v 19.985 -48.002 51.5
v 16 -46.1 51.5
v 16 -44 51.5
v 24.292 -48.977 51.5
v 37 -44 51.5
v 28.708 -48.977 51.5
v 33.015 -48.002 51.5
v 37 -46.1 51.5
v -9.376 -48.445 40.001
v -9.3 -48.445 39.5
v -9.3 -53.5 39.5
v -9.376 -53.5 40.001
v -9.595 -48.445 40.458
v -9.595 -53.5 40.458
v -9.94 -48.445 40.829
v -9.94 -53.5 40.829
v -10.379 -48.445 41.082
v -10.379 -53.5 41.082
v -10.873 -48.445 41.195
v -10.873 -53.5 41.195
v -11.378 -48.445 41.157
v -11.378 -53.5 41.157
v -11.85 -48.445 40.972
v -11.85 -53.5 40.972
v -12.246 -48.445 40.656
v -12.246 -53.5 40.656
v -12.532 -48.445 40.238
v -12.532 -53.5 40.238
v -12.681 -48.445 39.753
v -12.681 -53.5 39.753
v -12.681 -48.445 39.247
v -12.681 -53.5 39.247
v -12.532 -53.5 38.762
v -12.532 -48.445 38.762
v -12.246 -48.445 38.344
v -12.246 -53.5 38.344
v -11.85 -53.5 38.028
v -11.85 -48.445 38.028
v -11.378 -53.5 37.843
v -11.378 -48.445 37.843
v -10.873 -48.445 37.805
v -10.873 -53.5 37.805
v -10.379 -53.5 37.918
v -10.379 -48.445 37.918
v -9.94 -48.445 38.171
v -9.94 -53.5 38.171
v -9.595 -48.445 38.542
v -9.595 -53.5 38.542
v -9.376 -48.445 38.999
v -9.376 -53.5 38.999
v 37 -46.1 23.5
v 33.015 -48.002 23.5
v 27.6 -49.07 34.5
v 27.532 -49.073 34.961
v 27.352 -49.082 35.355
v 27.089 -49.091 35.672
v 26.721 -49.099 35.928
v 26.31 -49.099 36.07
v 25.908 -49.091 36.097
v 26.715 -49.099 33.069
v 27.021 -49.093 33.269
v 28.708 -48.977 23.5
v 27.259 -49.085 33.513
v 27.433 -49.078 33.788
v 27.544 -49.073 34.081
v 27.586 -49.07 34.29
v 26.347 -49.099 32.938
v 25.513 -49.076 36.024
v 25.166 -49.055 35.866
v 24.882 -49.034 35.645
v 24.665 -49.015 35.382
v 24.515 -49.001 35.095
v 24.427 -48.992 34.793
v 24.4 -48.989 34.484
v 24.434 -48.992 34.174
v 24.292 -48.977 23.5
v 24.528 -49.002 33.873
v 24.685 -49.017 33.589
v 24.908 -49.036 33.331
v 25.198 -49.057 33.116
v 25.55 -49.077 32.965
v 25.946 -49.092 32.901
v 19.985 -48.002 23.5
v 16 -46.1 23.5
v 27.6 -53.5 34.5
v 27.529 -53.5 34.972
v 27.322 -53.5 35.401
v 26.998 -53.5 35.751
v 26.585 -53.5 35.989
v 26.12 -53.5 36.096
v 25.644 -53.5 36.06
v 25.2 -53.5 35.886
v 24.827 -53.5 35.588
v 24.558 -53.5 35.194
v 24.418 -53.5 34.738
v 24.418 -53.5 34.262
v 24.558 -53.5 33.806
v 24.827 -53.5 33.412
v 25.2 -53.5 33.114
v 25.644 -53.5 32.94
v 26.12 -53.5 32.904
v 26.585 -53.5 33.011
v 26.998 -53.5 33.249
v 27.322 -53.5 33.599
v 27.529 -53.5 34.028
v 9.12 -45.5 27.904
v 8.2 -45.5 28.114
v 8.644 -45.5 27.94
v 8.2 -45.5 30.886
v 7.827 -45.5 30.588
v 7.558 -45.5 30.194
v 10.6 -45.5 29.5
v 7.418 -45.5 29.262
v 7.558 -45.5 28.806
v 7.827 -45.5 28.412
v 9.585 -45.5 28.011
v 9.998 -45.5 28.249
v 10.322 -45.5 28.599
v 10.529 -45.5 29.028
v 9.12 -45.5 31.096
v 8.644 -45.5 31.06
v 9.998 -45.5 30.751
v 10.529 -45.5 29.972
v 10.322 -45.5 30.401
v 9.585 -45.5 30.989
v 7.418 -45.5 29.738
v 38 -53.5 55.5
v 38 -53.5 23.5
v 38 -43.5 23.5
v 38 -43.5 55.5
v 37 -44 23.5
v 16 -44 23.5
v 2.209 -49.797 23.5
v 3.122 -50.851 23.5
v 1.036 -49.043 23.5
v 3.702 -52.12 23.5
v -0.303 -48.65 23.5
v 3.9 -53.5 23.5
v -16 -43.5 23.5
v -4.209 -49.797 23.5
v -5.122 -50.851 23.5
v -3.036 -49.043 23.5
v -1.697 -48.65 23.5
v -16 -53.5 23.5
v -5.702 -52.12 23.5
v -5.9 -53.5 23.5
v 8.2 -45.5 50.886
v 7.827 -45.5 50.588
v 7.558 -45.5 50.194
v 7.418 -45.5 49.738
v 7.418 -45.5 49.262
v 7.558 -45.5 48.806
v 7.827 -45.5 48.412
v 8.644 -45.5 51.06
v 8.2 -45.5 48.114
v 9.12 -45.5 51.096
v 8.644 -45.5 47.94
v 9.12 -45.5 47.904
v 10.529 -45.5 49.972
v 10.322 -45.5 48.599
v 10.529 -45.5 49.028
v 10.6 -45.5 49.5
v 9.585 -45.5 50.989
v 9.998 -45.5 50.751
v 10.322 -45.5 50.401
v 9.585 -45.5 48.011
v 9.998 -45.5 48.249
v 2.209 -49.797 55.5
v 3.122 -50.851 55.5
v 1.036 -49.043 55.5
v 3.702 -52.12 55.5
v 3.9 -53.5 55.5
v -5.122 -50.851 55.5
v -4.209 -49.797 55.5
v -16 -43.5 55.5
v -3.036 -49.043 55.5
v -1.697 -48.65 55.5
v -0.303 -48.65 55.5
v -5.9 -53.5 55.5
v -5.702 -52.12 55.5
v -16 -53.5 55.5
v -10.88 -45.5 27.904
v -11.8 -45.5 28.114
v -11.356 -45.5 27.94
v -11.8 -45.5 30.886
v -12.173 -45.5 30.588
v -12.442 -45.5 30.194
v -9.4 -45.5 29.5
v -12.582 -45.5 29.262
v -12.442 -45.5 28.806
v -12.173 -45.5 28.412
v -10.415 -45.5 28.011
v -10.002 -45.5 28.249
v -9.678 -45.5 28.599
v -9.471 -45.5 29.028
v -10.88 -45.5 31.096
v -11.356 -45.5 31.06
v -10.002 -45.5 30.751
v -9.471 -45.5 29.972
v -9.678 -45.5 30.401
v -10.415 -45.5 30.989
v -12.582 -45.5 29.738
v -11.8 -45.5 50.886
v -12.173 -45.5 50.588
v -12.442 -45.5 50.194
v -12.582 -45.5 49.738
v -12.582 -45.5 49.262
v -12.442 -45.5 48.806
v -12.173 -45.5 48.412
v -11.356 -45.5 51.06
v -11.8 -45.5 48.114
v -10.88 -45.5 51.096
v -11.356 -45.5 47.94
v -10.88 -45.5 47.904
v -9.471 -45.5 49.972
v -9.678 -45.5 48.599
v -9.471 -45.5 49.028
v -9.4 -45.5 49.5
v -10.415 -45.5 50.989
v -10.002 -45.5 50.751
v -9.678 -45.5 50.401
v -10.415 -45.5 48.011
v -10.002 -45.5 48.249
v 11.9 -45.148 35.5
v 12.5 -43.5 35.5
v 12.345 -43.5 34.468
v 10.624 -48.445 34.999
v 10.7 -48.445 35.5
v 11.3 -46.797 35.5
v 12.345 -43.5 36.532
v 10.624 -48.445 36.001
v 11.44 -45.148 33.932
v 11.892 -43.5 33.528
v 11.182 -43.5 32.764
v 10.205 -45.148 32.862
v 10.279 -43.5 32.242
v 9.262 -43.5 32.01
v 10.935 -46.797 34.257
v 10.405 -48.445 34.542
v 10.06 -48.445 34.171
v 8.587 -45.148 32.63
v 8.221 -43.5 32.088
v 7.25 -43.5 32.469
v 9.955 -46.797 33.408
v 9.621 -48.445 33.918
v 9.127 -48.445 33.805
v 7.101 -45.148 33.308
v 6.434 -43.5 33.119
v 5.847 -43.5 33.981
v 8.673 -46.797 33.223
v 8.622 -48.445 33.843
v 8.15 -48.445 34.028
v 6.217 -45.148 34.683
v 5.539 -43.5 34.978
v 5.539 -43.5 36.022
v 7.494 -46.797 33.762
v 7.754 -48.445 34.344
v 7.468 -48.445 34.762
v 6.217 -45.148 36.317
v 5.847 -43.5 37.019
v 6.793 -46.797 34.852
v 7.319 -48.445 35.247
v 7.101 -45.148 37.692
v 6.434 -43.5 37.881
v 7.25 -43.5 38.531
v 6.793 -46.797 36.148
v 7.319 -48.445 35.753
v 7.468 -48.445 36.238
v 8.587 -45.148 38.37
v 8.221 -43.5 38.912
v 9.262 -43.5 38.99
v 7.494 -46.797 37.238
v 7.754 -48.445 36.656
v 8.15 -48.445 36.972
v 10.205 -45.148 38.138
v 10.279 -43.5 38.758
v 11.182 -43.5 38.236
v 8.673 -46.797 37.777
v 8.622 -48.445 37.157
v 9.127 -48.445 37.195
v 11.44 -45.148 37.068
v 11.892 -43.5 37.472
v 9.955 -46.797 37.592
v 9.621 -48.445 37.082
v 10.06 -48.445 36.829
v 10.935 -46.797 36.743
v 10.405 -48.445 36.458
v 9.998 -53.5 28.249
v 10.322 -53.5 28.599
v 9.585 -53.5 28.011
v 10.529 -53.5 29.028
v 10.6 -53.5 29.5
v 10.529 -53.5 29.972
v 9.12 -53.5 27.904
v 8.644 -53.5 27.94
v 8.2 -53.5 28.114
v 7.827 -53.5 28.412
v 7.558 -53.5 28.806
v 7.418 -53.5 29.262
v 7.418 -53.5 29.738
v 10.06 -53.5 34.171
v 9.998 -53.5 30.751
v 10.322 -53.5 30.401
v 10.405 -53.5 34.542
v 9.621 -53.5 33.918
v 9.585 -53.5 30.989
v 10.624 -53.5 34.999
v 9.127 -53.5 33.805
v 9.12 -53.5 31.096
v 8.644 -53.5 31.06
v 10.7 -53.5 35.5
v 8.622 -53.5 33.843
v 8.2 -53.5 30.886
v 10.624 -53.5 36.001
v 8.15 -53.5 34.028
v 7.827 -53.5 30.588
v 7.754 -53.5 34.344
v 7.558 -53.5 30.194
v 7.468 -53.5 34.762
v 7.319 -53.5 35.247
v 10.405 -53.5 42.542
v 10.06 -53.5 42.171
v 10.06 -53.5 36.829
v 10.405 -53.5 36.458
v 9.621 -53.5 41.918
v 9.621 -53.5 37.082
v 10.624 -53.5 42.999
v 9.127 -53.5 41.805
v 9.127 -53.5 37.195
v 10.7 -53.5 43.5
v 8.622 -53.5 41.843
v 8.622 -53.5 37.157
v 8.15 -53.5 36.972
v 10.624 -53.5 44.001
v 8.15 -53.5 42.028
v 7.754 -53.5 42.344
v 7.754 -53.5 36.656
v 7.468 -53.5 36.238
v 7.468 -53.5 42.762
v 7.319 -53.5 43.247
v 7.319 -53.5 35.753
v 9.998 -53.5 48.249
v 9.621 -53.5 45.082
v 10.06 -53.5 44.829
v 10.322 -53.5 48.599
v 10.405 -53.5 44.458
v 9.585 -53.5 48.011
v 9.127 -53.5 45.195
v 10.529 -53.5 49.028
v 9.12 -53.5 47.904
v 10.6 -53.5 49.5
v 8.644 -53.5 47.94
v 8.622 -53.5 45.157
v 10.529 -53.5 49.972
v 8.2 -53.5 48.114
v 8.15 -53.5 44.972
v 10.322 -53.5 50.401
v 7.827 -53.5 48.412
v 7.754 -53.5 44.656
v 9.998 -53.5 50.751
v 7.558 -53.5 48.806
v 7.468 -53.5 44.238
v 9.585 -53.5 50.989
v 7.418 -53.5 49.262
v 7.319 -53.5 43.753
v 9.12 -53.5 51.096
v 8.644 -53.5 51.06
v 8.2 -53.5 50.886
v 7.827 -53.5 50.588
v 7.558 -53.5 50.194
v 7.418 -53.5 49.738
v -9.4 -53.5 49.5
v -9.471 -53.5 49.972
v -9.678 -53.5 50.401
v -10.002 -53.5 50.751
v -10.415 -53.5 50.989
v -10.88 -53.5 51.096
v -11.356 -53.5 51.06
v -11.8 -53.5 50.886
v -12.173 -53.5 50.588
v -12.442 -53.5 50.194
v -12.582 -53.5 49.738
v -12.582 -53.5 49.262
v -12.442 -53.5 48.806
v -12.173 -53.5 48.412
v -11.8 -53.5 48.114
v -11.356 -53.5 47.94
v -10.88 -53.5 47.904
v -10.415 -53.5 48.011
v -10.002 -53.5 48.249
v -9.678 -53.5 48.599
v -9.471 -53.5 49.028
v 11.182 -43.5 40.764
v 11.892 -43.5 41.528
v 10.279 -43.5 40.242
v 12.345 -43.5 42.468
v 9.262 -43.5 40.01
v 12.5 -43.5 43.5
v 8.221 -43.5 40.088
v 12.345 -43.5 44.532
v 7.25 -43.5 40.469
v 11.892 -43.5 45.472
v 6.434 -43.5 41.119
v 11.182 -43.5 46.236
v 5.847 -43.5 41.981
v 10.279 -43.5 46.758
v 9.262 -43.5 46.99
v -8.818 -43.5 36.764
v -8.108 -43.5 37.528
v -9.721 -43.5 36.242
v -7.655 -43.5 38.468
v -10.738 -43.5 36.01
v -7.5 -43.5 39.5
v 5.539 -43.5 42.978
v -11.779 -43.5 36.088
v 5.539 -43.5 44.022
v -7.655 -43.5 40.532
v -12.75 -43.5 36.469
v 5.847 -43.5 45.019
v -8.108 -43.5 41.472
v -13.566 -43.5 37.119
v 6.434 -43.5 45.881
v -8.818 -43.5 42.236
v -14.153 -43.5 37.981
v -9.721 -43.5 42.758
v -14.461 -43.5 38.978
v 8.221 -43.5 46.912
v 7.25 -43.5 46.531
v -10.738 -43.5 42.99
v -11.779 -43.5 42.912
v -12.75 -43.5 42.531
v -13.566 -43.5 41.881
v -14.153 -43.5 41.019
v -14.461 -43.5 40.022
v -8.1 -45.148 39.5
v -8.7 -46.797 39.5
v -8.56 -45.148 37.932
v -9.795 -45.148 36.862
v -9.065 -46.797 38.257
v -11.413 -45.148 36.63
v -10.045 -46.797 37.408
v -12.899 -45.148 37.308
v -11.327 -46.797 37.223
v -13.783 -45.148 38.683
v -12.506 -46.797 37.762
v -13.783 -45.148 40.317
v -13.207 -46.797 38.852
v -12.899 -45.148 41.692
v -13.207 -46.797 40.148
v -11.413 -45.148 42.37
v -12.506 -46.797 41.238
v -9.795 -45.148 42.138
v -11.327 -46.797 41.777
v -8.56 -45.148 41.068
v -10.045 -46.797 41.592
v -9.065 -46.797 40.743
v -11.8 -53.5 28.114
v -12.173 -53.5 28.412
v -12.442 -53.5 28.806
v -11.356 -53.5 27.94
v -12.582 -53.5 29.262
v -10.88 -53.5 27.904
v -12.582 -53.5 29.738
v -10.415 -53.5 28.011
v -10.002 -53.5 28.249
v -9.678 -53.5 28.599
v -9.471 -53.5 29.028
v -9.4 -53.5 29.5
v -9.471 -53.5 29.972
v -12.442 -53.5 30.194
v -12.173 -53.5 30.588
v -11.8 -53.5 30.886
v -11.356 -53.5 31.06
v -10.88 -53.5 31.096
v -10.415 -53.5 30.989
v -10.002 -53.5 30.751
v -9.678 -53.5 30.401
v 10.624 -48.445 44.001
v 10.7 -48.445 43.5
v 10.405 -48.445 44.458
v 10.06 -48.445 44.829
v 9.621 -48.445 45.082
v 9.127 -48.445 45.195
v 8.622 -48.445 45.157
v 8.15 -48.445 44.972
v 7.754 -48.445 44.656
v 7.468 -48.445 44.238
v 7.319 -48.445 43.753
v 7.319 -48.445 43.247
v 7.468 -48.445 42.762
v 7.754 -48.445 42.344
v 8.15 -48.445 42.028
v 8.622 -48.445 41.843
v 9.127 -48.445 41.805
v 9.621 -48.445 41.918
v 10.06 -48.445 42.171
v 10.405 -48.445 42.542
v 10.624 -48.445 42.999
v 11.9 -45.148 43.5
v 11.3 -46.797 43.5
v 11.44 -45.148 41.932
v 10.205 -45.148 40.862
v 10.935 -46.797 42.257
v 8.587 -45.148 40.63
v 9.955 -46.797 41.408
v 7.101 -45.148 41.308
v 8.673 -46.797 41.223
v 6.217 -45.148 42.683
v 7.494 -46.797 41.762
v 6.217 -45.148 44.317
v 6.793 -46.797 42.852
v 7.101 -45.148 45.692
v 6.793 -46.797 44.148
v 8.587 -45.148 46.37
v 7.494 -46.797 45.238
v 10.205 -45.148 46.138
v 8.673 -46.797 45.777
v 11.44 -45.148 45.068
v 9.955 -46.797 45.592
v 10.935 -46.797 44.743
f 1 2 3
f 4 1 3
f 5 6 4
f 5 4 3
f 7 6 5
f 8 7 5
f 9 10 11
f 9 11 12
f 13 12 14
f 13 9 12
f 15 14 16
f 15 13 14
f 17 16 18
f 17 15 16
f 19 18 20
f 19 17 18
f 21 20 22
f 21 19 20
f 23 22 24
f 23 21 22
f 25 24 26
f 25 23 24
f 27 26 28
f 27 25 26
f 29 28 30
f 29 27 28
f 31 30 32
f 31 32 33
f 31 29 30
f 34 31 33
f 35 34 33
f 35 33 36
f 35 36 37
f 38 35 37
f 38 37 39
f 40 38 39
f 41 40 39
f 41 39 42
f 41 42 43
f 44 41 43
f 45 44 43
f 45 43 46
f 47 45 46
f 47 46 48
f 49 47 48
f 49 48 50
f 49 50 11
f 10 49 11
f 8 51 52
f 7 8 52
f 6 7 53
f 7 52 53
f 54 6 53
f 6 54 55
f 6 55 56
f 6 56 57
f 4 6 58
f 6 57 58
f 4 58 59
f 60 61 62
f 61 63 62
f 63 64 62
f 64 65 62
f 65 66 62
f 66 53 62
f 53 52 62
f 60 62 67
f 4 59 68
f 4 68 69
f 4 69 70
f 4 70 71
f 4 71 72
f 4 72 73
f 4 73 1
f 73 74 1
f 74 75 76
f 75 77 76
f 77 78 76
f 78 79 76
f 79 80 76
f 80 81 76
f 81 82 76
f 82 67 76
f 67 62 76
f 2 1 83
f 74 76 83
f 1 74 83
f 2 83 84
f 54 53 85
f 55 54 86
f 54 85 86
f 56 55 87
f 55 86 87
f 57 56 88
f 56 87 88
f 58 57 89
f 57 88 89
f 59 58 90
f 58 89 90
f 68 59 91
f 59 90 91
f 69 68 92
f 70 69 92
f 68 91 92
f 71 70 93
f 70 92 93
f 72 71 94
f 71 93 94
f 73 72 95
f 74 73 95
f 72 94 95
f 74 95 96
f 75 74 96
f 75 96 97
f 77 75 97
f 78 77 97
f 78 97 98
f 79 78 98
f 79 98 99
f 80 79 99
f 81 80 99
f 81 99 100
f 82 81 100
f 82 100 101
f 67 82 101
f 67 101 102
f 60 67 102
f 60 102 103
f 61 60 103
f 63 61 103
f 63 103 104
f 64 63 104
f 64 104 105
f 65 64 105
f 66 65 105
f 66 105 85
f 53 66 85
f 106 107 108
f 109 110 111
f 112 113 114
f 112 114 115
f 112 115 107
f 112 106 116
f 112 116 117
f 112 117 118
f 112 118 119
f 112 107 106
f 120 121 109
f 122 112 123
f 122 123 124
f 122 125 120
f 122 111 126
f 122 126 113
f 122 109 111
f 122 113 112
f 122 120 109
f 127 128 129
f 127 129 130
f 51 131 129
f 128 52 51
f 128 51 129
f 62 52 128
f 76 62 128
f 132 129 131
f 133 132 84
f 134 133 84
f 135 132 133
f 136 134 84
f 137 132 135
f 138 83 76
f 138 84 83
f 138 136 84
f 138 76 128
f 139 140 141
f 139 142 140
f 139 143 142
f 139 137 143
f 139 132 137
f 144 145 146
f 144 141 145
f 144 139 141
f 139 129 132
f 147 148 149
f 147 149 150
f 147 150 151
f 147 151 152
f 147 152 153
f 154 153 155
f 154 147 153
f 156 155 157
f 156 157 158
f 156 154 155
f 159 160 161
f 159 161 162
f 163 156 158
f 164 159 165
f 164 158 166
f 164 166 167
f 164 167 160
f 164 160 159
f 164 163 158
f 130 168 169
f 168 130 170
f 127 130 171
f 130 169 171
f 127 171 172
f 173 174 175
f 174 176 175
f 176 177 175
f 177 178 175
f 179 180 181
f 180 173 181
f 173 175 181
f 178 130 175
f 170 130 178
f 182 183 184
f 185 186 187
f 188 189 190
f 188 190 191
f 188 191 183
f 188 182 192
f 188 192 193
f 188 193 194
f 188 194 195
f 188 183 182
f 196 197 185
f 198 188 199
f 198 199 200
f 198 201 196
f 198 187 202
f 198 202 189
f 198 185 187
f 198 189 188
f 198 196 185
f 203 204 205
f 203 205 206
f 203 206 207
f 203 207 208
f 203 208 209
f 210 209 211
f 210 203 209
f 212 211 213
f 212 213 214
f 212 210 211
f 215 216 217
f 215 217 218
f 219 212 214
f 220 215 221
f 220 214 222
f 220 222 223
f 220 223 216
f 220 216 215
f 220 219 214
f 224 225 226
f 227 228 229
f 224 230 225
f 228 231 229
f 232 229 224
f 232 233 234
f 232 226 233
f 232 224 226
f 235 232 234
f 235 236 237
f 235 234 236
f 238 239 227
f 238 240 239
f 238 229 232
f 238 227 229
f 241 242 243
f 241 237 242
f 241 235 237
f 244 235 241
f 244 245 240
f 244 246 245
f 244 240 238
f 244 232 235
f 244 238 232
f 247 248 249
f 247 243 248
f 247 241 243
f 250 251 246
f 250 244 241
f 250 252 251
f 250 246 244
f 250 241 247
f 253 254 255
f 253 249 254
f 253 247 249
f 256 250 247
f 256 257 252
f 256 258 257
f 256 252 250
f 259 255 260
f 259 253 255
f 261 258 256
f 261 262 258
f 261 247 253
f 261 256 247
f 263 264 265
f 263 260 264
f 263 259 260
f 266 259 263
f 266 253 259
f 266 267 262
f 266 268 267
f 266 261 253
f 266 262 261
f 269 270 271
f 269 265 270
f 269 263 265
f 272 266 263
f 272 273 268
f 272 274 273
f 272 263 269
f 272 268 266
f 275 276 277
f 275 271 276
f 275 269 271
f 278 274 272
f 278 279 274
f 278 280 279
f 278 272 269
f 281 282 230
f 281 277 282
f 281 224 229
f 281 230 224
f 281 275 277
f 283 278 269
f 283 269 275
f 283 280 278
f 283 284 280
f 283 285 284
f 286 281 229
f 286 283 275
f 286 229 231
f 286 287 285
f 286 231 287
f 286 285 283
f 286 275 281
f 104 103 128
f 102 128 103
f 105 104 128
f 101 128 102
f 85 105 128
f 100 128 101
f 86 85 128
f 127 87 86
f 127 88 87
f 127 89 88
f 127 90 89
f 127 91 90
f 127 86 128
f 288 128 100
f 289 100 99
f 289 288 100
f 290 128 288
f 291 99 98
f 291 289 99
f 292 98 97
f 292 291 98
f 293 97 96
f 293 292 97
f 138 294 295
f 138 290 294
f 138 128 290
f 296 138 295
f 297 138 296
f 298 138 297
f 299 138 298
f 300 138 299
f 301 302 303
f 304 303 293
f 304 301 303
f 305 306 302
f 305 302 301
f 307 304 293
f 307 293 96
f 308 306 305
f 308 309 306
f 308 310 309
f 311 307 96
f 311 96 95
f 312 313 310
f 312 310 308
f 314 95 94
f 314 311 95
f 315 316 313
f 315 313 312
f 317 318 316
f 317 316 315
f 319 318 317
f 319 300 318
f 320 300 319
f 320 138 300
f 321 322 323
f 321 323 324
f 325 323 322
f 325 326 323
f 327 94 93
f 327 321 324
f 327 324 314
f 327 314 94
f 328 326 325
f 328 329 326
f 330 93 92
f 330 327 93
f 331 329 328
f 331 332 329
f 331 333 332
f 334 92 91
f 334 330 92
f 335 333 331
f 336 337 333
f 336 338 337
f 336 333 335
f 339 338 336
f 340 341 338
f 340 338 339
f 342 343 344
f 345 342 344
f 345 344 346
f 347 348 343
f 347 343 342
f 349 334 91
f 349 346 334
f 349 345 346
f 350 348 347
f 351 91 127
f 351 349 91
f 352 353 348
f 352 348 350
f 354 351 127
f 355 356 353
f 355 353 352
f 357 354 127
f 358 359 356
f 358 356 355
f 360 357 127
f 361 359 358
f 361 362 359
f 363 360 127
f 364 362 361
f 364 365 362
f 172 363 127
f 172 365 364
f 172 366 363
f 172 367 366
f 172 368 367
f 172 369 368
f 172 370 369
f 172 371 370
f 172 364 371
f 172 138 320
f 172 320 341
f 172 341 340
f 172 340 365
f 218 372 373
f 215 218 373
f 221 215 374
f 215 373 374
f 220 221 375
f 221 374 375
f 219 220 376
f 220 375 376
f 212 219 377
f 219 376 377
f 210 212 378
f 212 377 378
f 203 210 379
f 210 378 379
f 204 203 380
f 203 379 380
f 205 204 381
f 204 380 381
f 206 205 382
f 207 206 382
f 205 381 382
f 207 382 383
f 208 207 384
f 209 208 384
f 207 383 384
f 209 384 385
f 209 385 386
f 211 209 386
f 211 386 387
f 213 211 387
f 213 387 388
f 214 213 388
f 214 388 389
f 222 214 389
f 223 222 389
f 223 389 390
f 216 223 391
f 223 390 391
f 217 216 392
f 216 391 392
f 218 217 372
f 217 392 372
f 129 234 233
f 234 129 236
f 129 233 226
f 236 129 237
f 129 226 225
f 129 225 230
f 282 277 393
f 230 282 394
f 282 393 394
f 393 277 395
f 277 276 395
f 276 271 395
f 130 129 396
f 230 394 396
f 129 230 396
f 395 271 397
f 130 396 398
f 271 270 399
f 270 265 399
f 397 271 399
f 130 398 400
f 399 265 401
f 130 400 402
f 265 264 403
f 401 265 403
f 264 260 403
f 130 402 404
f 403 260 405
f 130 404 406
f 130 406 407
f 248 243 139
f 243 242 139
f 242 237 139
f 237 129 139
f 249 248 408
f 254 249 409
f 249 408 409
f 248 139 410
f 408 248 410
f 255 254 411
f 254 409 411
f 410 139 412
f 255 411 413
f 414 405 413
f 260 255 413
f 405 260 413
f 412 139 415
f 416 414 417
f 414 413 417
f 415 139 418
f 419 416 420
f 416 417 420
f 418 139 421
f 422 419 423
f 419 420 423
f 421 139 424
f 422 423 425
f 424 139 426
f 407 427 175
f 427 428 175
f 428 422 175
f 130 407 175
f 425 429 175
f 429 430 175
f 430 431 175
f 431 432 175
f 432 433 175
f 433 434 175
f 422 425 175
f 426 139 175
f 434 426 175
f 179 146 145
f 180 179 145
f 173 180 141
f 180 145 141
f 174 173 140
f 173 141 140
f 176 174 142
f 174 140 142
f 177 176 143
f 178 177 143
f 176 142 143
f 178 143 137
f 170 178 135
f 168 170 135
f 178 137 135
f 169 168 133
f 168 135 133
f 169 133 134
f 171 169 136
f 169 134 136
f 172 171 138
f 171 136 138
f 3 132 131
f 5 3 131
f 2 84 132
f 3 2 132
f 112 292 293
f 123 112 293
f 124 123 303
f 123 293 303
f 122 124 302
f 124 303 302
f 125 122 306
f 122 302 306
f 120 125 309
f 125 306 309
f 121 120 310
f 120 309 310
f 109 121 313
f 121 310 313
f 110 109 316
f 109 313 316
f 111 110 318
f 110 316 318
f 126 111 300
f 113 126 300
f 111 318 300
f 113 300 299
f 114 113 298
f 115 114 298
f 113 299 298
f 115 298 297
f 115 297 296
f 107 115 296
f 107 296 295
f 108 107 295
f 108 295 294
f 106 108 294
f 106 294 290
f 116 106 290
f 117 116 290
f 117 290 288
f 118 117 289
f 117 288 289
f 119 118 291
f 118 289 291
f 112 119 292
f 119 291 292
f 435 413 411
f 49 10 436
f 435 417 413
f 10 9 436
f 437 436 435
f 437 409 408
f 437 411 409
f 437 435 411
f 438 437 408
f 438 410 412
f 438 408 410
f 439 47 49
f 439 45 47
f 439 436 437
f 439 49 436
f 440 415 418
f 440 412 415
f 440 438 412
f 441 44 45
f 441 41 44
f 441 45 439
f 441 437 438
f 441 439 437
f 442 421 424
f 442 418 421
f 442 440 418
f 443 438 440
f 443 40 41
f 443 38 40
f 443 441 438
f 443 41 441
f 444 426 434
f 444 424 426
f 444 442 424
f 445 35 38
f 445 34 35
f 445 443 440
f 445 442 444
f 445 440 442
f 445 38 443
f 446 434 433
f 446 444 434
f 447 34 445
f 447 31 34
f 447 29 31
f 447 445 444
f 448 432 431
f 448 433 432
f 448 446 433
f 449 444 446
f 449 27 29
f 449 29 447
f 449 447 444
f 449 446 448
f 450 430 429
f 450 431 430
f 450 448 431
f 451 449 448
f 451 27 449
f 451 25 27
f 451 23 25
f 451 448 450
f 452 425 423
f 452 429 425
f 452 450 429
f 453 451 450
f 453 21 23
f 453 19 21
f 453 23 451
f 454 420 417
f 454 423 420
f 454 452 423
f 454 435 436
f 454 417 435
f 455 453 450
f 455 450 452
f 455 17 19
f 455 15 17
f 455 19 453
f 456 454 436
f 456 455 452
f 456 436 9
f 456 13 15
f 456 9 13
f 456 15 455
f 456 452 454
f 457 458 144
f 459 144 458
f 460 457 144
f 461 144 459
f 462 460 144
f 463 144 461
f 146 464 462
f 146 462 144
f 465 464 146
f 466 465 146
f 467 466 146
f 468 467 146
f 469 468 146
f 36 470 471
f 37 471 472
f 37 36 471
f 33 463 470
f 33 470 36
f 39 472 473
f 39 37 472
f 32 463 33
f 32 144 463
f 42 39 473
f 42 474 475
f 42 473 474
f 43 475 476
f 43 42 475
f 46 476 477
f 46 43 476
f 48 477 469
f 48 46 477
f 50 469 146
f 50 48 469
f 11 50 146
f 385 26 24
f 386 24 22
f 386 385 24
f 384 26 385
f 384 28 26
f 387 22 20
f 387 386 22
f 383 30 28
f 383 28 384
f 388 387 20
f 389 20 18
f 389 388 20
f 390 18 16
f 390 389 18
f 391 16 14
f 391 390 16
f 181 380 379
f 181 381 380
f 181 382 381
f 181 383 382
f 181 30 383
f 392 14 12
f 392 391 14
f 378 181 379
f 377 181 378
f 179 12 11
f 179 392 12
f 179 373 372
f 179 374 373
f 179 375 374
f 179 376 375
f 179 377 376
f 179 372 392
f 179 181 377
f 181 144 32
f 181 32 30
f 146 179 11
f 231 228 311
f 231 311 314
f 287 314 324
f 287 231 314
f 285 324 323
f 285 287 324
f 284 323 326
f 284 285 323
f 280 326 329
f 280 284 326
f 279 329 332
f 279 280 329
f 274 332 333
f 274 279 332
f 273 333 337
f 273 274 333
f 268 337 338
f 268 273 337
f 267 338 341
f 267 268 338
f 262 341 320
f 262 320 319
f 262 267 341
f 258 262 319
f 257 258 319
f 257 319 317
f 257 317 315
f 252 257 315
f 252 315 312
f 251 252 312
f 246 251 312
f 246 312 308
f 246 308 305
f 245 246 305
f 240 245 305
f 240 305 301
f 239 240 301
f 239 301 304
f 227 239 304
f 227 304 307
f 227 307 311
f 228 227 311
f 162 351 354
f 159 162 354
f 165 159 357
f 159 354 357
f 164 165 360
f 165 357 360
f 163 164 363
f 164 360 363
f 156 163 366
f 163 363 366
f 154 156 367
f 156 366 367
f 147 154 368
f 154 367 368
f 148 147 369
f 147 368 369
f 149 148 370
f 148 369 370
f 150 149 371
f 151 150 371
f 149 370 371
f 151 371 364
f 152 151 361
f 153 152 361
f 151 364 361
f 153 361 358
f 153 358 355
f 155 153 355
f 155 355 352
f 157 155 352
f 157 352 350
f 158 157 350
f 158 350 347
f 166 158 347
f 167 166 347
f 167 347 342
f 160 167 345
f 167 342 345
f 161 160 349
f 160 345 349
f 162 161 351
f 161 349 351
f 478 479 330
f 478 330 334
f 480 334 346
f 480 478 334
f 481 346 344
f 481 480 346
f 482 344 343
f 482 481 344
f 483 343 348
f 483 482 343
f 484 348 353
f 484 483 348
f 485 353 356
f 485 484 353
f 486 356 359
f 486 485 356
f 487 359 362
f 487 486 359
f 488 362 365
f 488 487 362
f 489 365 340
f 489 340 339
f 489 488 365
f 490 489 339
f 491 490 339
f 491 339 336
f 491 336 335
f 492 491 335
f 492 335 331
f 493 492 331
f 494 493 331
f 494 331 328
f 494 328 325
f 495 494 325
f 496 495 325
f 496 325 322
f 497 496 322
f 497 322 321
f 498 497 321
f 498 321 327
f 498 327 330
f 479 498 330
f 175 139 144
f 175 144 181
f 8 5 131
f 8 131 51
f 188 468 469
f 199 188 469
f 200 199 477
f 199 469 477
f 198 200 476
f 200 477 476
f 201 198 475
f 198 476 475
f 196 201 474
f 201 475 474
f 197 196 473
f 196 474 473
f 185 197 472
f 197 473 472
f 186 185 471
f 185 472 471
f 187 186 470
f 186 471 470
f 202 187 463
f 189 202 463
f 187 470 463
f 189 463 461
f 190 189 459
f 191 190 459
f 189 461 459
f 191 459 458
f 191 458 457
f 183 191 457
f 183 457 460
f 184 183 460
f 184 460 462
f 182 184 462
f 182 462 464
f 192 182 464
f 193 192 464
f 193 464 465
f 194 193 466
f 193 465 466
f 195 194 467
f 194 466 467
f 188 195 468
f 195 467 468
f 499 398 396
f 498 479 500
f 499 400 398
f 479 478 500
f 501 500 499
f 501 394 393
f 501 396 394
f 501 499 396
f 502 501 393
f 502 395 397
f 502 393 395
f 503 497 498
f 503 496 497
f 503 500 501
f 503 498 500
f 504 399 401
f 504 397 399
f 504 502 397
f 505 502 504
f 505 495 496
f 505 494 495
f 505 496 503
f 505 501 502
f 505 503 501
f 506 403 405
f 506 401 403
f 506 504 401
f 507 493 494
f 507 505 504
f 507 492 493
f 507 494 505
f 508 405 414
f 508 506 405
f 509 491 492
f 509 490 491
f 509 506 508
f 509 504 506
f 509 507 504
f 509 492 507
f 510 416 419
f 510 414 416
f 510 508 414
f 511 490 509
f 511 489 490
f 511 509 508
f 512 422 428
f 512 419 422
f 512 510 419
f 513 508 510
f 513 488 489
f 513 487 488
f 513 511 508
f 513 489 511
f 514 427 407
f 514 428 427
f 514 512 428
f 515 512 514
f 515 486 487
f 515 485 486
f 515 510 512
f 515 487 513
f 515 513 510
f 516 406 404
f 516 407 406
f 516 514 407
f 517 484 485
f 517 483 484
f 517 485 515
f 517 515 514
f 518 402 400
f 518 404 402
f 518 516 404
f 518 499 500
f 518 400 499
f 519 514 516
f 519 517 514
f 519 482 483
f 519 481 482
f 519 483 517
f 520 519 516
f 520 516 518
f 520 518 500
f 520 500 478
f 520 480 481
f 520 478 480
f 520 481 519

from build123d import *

# Parameters (mm, degrees)
SKETCH056_W     = 30
SKETCH056_H     = 32
SKETCH056_R     = 1.7
PAD037_DEPTH    = 10
SKETCH057_R     = 3.5
POCKET020_DEPTH = 5
POCKET020_TAPER = 20
SKETCH059_R     = 4.9
POCKET022_DEPTH = 32
SKETCH060_W     = 32
SKETCH060_H     = 10
PAD038_DEPTH    = 24
POCKET023_DEPTH = 28
SKETCH062_R     = 1.6
POCKET024_DEPTH = 8


with BuildPart() as part:
    # Sketch056 → Pad037 (new body)
    with BuildSketch(Plane.XZ):
        Rectangle(SKETCH056_W, SKETCH056_H)
        with Locations((10, 4)):
            Circle(SKETCH056_R, mode=Mode.SUBTRACT)
        with Locations((10, -4)):
            Circle(SKETCH056_R, mode=Mode.SUBTRACT)
        with Locations((-10, 0)):
            Circle(SKETCH056_R, mode=Mode.SUBTRACT)
    extrude(amount=PAD037_DEPTH)

    # Sketch057 (on Face8 of Pad037) → Pocket020 (cut)
    with BuildSketch(Plane(origin=(0, 0, 0), x_dir=(1, 0, 0), z_dir=(0, 1, 0))):
        with Locations((-10, 0)):
            Circle(SKETCH057_R)
        with Locations((10, 4)):
            Circle(SKETCH057_R)
        with Locations((10, -4)):
            Circle(SKETCH057_R)
    extrude(amount=-POCKET020_DEPTH, taper=POCKET020_TAPER, mode=Mode.SUBTRACT)

    # Sketch059 (on Face1 of Pocket020) → Pocket022 (cut)
    with BuildSketch(Plane(origin=(0, 0, -16), x_dir=(1, 0, 0), z_dir=(0, 0, -1))):
        with Locations((0, 10)):
            Circle(SKETCH059_R)
    extrude(amount=-POCKET022_DEPTH, mode=Mode.SUBTRACT)

    # Sketch060 (on Face3 of Pocket022) → Pad038 (join)
    with BuildSketch(Plane(origin=(15, 0, 0), x_dir=(0, 0, 1), z_dir=(1, 0, 0))):
        with Locations((0, 5)):
            Rectangle(SKETCH060_W, SKETCH060_H)
    extrude(amount=PAD038_DEPTH)

    # Sketch061 (on Face2 of Pad038) → Pocket023 (cut)
    with BuildSketch(Plane(origin=(0, 0, -16), x_dir=(1, 0, 0), z_dir=(0, 0, -1))):
        with BuildLine():
            Line((17, 2.6), (17, 0.5))
            Line((17, 0.5), (38, 0.5))
            Line((38, 0.5), (38, 2.6))
            ThreePointArc((38, 2.6), (27.5, 5.6), (17, 2.6))
        make_face()
    extrude(amount=-POCKET023_DEPTH, mode=Mode.SUBTRACT)

    # Sketch062 (on Face3 of Pocket023) → Pocket024 (cut)
    with BuildSketch(Plane.XZ.offset(10)):
        with Locations((-10, 10)):
            Circle(SKETCH062_R)
        with Locations((-10, -10)):
            Circle(SKETCH062_R)
        with Locations((10, 10)):
            Circle(SKETCH062_R)
        with Locations((10, -10)):
            Circle(SKETCH062_R)
        with Locations((27, -5)):
            Circle(SKETCH062_R)
    extrude(amount=-POCKET024_DEPTH, mode=Mode.SUBTRACT)


with BuildPart() as part_1:
    # Body010 placement: moved
    add(part.part.moved(Location((-1, -43.5, 39.5))))


solid = part_1.part
